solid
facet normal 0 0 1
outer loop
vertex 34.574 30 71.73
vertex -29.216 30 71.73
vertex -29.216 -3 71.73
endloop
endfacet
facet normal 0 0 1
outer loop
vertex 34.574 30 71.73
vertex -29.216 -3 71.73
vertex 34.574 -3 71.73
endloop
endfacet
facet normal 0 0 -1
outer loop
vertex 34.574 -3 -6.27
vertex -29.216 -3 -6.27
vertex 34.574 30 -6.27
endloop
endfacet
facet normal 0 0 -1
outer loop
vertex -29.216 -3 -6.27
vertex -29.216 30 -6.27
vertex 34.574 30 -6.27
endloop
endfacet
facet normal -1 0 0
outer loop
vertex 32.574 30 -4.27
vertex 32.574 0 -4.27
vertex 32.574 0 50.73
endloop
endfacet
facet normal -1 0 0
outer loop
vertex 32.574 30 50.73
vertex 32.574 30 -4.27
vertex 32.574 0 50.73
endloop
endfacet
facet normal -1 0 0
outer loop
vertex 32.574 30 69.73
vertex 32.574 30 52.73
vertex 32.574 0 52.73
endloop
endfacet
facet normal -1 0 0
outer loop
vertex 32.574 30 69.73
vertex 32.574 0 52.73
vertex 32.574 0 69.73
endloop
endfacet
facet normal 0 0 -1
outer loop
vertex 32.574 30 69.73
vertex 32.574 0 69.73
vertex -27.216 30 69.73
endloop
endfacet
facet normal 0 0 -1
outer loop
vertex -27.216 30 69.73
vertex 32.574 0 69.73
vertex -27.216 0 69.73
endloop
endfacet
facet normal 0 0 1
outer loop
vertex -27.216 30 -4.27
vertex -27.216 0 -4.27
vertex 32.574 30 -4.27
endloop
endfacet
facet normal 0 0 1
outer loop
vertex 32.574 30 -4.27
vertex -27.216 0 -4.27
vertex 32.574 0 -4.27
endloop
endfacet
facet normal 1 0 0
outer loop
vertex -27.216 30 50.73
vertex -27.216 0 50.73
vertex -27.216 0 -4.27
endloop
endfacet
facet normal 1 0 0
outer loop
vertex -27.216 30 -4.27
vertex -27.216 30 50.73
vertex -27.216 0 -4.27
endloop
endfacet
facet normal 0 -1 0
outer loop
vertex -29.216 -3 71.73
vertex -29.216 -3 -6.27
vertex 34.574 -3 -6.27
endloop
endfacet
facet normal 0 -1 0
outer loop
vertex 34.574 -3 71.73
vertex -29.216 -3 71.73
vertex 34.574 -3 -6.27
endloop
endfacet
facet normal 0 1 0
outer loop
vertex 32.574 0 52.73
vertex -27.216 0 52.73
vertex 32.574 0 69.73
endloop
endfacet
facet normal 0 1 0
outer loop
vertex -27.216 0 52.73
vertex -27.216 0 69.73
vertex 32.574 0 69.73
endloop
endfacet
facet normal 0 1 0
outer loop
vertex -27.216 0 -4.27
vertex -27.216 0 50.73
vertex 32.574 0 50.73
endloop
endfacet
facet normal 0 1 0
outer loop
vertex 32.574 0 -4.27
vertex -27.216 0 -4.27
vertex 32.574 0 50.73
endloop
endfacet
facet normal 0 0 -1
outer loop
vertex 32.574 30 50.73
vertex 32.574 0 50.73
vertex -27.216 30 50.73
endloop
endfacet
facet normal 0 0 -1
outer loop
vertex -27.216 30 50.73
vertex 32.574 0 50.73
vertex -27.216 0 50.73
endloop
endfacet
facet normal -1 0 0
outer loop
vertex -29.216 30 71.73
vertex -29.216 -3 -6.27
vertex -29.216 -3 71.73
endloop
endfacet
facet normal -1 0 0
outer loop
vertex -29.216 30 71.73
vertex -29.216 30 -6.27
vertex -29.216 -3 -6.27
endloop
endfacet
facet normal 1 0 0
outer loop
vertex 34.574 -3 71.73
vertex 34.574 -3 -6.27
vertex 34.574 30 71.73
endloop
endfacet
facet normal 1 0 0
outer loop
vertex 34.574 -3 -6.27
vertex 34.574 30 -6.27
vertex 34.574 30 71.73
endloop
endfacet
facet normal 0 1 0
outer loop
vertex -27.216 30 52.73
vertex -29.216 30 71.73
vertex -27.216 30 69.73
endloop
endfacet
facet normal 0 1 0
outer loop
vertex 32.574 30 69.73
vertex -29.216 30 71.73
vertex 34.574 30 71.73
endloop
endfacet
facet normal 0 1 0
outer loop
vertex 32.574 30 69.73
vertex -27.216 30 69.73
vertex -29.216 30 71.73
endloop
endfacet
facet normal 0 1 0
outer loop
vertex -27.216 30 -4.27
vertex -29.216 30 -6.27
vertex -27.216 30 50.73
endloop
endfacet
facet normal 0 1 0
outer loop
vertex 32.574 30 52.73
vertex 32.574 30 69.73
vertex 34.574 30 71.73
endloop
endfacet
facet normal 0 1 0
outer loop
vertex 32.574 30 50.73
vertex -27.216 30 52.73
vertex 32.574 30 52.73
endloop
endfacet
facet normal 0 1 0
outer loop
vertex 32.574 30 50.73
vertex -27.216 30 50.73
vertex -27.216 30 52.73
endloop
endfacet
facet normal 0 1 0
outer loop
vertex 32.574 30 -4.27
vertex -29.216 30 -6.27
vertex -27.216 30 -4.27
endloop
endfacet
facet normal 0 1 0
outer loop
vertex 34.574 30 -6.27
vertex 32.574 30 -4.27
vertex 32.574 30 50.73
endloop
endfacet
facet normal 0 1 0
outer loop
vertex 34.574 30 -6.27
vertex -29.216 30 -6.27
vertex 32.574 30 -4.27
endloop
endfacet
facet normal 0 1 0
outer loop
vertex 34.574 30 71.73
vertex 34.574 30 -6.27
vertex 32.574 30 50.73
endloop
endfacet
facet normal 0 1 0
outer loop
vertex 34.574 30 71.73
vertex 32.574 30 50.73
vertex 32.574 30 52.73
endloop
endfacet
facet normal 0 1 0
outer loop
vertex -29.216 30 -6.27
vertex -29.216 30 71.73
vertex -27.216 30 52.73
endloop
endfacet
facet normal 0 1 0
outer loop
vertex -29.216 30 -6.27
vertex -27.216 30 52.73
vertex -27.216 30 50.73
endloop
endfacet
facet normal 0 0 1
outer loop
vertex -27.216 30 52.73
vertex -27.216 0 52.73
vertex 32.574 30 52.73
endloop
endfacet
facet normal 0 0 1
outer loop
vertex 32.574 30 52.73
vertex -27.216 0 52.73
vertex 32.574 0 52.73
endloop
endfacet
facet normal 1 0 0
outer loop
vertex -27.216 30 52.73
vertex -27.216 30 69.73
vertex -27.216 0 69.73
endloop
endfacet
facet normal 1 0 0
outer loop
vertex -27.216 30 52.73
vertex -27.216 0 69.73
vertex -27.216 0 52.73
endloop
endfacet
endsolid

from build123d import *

# Parameters (mm, degrees)
SKETCH2_W           = 63.79
SKETCH2_H           = 78
SKETCH2_W_2         = 59.79
SKETCH2_H_2         = 55
SKETCH2_H_3         = 17
BOSS_EXTRUDE1_DEPTH = 30
SKETCH4_W           = 63.79
SKETCH4_H           = 78
BOSS_EXTRUDE2_DEPTH = 3


with BuildPart() as part:
    # Sketch2 → Boss-Extrude1 (new body)
    with BuildSketch(Plane(origin=(0, 0, 0), x_dir=(1, 0, 0), z_dir=(0, 1, 0))):
        with Locations((2.679262675, -32.730163819)):
            Rectangle(SKETCH2_W, SKETCH2_H)
        with Locations((2.679262675, -23.230163819)):
            Rectangle(SKETCH2_W_2, SKETCH2_H_2, mode=Mode.SUBTRACT)
        with Locations((2.679262675, -61.230163819)):
            Rectangle(SKETCH2_W_2, SKETCH2_H_3, mode=Mode.SUBTRACT)
    extrude(amount=BOSS_EXTRUDE1_DEPTH)

    # Sketch4 → Boss-Extrude2 (add)
    with BuildSketch(Plane.XZ):
        with Locations((2.679262675, 32.730163819)):
            Rectangle(SKETCH4_W, SKETCH4_H)
    extrude(amount=BOSS_EXTRUDE2_DEPTH)


solid = part.part
